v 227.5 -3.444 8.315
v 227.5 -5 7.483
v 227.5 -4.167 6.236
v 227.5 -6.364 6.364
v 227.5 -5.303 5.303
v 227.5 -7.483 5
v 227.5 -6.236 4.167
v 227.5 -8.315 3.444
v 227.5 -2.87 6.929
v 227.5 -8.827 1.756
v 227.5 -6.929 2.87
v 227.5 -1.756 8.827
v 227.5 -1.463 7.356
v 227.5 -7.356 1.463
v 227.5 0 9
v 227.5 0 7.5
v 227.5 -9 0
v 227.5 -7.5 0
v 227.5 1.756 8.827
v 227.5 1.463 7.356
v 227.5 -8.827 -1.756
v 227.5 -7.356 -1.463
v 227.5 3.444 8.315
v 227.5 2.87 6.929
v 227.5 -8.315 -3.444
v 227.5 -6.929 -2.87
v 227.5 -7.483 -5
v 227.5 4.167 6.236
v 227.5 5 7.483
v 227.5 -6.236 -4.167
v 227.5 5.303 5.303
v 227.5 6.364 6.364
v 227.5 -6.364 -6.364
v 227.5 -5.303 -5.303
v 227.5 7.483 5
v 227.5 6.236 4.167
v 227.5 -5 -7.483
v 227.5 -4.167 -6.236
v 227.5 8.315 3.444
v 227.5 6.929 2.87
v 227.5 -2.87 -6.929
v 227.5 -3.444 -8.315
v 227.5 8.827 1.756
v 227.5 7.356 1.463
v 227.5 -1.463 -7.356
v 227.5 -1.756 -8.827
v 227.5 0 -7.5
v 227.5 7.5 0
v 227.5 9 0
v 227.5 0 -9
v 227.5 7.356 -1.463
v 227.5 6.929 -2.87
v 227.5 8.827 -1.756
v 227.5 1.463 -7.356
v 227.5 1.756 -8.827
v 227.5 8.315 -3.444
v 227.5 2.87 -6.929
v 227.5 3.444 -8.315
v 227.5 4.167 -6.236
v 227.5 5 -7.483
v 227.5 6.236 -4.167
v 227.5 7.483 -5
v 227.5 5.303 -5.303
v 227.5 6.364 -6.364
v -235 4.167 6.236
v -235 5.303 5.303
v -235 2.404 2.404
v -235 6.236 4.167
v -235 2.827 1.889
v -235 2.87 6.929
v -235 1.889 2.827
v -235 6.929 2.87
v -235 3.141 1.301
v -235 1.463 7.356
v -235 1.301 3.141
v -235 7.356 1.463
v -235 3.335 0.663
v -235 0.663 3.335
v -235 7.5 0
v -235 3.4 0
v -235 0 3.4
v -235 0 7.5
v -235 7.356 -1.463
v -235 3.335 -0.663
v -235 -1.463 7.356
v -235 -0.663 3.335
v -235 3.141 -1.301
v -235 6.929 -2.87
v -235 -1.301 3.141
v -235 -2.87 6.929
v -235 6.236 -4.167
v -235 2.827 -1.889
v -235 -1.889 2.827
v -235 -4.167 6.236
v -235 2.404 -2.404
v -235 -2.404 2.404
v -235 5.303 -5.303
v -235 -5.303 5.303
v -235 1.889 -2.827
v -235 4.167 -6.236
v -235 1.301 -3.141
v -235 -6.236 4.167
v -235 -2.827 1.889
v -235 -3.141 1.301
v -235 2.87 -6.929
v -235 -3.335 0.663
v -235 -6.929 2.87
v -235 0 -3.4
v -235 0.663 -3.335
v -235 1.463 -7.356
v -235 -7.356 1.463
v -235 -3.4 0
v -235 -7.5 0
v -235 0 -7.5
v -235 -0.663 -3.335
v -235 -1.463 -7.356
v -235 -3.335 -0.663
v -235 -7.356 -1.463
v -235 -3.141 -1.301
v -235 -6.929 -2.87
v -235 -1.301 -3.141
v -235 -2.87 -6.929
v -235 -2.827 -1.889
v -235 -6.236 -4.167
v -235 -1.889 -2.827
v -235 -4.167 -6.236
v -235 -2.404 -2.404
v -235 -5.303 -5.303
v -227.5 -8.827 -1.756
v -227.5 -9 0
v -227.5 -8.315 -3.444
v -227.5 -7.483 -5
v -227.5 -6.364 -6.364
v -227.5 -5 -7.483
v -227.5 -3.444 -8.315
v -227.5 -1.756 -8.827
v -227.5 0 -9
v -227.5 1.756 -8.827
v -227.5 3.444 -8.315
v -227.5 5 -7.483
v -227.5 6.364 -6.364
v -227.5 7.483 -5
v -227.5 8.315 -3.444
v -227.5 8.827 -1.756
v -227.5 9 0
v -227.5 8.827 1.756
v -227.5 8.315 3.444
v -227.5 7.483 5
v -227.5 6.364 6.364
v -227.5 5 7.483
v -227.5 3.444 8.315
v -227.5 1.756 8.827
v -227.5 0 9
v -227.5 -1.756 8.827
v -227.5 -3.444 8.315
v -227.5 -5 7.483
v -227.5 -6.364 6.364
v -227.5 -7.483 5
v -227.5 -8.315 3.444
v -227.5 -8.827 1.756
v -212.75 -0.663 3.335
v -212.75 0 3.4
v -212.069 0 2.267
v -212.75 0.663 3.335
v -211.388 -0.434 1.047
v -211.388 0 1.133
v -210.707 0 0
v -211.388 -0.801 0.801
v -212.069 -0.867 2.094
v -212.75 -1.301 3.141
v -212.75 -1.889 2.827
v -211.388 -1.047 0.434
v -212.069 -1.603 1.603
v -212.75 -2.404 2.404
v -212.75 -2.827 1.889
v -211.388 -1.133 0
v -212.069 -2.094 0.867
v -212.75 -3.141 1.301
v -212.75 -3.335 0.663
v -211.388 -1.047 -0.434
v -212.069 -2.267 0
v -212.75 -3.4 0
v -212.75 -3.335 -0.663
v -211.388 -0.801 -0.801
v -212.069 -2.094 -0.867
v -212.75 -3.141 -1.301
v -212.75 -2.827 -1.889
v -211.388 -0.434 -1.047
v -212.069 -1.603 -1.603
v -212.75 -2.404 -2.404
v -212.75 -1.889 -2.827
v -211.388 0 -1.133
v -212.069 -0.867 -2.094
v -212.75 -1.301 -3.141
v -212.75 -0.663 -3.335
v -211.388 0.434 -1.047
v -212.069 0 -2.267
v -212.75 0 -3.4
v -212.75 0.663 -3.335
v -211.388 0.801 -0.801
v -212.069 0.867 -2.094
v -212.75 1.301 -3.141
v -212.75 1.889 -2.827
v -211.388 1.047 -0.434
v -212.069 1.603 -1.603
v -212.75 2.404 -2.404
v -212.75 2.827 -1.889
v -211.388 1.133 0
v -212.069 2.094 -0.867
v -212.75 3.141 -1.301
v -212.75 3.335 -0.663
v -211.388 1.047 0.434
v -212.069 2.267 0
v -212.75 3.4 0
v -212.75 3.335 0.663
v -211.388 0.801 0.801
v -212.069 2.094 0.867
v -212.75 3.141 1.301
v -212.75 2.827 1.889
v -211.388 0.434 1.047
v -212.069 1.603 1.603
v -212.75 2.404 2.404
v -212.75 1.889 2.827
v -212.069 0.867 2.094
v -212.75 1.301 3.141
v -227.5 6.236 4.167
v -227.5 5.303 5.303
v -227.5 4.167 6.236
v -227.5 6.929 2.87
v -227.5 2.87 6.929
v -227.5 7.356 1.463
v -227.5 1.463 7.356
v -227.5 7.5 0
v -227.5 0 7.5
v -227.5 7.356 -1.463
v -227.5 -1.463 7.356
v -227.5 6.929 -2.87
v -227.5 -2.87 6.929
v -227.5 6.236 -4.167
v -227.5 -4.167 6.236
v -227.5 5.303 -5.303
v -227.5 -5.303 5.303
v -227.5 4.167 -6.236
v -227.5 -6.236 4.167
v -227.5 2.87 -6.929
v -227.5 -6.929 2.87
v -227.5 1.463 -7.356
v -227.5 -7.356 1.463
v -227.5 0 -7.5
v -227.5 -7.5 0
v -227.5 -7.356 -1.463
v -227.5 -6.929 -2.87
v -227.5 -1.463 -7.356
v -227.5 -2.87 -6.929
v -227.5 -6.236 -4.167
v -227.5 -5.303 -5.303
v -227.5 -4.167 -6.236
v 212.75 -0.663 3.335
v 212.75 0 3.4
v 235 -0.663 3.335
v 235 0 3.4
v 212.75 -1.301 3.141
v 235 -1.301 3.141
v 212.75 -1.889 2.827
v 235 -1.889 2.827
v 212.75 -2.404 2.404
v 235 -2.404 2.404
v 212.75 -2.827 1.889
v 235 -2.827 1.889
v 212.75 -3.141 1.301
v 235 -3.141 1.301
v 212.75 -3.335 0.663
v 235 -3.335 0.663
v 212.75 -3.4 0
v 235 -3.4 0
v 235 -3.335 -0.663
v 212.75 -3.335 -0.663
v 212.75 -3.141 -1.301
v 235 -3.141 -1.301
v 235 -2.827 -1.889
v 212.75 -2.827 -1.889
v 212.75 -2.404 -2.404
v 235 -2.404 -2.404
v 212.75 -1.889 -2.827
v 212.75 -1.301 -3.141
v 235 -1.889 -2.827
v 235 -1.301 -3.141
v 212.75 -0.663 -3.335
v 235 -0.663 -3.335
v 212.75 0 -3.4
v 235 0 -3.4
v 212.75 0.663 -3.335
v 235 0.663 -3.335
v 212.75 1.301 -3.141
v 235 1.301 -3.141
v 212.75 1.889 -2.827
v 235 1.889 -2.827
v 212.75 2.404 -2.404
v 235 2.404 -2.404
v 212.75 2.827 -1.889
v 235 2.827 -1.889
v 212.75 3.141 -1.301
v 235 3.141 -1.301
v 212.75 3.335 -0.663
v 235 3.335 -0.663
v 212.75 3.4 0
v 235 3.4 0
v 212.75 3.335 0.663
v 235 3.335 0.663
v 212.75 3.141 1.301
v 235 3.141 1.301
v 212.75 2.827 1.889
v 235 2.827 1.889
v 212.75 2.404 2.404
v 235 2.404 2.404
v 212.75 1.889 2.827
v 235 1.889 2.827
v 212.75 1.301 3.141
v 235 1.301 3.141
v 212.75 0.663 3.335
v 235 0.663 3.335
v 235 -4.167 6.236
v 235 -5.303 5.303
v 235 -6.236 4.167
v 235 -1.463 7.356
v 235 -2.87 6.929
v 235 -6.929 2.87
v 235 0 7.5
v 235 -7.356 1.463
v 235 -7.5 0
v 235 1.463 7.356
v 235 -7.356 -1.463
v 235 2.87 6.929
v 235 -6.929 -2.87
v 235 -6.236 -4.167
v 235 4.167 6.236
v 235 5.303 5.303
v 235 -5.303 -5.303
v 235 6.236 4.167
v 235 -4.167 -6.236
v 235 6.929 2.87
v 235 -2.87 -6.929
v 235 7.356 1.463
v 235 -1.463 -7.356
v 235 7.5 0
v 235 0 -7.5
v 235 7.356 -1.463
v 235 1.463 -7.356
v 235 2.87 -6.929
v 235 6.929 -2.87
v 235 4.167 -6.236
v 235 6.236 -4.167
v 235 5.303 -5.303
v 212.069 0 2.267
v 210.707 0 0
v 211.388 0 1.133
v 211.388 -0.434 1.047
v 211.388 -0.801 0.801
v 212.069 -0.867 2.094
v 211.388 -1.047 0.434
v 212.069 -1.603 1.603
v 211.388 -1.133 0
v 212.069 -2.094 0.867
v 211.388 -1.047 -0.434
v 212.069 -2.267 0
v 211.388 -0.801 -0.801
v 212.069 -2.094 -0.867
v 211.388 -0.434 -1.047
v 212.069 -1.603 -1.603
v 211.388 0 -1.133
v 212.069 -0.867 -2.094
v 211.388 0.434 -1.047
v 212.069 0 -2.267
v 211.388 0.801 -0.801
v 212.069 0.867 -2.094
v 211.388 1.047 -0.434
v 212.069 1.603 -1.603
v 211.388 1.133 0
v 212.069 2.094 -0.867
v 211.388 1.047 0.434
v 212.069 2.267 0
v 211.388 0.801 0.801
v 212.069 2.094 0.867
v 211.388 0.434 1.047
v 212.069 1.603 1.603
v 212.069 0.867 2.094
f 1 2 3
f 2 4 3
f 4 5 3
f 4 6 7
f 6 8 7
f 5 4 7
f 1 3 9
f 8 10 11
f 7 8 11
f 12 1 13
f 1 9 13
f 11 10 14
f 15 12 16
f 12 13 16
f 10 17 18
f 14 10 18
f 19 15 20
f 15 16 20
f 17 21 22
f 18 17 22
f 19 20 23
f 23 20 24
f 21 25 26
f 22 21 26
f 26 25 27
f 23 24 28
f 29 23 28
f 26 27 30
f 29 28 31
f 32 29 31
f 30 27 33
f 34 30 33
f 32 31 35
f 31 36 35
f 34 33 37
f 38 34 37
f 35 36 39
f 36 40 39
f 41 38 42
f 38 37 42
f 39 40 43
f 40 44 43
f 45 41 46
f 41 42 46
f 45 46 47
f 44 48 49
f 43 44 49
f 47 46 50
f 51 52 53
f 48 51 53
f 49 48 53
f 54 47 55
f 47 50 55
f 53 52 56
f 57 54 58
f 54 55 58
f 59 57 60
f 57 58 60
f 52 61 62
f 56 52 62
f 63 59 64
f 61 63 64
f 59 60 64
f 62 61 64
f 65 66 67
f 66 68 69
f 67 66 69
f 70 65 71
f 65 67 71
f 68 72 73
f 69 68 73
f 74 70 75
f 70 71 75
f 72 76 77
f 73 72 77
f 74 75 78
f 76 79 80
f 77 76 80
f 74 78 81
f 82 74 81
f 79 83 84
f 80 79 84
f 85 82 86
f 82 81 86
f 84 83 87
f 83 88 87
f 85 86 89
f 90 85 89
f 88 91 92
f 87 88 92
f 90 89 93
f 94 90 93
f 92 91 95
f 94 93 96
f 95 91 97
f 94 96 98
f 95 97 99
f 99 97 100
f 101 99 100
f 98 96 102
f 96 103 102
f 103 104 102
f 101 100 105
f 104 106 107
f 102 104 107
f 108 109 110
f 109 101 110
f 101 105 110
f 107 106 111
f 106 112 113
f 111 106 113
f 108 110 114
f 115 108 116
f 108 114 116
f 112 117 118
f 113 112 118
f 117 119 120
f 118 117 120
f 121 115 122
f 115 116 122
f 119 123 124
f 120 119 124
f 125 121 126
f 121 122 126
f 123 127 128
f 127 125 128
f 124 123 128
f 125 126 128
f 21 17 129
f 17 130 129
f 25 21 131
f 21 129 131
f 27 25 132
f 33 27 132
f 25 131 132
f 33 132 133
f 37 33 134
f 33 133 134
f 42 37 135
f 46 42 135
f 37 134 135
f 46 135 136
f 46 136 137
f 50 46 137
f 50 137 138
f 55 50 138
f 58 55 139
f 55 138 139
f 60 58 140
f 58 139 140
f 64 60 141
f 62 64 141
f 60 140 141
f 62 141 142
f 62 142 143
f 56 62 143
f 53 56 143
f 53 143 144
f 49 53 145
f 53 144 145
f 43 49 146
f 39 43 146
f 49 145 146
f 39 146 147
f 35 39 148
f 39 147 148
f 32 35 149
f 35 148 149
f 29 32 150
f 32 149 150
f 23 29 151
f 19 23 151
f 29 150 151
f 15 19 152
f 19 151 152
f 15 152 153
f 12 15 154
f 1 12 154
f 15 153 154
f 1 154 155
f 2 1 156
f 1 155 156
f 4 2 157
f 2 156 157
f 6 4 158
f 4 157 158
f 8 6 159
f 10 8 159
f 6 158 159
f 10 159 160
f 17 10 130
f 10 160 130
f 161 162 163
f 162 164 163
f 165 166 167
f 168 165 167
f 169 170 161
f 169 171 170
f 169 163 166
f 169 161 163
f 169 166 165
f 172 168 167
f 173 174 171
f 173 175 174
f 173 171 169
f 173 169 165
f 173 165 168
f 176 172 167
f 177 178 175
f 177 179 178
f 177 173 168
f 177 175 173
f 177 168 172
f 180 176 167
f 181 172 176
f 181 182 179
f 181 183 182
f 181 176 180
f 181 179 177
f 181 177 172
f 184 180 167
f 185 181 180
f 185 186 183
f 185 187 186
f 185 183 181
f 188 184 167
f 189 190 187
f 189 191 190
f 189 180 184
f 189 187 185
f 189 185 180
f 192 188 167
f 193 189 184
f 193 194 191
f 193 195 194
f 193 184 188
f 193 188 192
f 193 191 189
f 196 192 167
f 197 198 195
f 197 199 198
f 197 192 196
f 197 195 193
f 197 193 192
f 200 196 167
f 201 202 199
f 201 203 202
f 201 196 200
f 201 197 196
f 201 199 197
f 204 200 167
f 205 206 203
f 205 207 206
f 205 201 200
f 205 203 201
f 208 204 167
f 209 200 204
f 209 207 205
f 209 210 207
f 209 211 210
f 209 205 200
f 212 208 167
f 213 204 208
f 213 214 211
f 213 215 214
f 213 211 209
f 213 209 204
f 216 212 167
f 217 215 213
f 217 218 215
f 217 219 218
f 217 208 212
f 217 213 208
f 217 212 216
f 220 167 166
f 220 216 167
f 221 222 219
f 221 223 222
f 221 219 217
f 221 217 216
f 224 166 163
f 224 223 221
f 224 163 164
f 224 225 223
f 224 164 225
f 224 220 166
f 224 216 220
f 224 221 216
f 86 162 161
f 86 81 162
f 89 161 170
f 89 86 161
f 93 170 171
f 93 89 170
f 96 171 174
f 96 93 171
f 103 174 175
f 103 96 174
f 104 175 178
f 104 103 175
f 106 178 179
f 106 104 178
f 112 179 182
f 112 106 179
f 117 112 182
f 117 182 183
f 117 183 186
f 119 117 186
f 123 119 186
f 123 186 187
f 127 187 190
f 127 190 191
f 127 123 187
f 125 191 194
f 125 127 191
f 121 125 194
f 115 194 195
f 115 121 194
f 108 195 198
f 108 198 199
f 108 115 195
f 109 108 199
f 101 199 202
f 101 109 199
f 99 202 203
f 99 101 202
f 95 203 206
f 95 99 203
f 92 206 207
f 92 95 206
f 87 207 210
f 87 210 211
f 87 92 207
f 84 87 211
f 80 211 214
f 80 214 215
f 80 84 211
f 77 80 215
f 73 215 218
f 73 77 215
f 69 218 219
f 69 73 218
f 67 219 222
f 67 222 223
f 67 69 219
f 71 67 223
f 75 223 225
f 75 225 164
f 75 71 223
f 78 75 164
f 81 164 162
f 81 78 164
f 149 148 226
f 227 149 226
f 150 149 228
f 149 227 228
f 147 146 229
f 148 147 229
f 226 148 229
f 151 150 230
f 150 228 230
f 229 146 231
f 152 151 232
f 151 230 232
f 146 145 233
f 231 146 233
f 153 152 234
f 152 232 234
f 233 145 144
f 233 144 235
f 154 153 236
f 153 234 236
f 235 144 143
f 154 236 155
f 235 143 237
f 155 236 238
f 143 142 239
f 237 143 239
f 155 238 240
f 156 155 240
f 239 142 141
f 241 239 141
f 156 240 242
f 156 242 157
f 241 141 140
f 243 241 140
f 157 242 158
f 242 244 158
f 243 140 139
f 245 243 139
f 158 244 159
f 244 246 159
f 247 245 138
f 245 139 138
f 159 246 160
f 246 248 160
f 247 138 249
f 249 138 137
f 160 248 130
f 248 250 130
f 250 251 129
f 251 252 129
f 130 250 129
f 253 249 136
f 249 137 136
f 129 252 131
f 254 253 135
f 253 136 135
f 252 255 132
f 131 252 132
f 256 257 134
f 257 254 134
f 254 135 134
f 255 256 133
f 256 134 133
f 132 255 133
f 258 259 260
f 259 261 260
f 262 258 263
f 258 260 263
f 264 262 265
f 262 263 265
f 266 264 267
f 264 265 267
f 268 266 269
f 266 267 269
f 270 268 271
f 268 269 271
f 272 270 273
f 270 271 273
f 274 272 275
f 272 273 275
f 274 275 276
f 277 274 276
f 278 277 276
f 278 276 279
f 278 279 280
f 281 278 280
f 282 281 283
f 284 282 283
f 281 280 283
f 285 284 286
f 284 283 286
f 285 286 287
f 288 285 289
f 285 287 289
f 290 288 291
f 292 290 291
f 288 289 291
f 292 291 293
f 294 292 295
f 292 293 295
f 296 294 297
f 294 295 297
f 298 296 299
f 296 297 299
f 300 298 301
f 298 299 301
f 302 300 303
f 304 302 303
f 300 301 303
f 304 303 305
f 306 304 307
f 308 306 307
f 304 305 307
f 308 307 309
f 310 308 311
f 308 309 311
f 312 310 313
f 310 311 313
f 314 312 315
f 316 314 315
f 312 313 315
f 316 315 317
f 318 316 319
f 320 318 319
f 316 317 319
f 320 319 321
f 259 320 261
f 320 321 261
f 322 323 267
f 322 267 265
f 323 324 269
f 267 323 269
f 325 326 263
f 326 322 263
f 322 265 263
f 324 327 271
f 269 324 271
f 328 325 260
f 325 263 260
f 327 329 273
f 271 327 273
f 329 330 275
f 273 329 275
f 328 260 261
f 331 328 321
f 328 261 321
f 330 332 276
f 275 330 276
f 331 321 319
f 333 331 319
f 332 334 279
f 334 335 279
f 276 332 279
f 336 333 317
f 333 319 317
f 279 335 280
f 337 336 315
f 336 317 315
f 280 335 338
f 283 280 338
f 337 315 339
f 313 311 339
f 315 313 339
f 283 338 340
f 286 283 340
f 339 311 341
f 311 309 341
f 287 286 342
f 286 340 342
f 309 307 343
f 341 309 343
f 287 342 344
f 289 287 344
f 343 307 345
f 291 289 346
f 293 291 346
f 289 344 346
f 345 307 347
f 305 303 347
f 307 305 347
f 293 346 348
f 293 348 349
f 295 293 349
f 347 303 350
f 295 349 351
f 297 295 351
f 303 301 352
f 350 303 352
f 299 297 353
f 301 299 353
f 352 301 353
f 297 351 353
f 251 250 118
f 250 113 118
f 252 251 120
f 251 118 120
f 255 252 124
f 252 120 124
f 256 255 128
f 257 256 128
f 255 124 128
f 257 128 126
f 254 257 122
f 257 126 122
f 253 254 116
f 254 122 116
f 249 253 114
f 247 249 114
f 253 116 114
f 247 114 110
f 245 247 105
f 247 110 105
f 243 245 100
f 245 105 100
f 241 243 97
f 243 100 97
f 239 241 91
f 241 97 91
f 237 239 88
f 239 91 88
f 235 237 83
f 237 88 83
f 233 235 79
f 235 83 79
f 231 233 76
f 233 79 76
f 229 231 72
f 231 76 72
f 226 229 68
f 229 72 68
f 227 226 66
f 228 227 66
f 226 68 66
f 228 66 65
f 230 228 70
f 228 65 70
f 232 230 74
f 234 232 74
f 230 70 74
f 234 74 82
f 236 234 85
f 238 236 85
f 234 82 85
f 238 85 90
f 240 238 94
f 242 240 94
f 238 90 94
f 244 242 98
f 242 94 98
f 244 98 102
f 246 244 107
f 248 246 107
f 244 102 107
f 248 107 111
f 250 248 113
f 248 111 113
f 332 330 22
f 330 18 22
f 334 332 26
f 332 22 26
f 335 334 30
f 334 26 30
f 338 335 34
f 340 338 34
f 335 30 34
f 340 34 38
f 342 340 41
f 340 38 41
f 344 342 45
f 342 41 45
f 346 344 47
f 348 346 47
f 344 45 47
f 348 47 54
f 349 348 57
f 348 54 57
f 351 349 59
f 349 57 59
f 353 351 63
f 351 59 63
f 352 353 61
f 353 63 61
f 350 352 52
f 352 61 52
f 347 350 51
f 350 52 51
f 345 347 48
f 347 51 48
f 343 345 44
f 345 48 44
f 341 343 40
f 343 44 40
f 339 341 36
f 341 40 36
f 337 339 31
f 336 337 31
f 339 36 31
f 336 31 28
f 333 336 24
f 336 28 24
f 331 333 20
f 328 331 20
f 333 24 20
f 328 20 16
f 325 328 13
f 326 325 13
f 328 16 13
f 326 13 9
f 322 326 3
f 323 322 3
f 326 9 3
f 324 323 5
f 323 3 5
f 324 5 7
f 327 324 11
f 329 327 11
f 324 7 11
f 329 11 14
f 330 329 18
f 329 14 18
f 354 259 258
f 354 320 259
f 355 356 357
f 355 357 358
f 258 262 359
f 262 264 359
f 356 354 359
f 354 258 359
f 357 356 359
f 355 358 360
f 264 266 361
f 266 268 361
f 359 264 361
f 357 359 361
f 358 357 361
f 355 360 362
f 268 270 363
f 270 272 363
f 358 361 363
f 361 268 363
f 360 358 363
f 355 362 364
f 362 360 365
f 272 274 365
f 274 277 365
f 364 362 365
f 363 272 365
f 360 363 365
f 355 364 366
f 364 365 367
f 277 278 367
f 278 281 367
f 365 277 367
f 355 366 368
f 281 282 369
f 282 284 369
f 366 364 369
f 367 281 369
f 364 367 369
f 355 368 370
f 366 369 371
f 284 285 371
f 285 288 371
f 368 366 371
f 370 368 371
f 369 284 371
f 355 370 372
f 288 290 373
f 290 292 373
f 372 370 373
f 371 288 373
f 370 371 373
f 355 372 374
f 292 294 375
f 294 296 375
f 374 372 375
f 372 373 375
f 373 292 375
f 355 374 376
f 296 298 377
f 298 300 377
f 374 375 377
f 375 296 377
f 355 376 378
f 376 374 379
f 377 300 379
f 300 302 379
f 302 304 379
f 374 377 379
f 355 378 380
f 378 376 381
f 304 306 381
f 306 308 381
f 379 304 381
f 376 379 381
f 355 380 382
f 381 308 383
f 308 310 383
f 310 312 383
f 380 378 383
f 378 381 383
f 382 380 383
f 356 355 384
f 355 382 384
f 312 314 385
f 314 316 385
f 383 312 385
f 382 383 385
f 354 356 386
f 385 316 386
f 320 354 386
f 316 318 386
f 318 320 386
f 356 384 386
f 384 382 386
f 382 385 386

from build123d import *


with BuildPart() as part:
    # Çizim1 → Döndür2 (revolve)
    with BuildSketch(Plane.XY, mode=Mode.PRIVATE) as d_nd_r2_sk:
        Polygon((-235, 0), (235, 0), (235, 7.5), (227.5, 7.5), (227.5, 9), (-227.5, 9), (-227.5, 7.5), (-235, 7.5), align=None)
    revolve(d_nd_r2_sk.sketch.rotate(Axis((-235, 0, 0), (1, 0, 0)), 180), axis=Axis((-235, 0, 0), (1, 0, 0)))

    # Çizim4 → M8 Dişli Delik3 (revolve, cut)
    with BuildSketch(Plane(origin=(-235, 0, 0), x_dir=(0, 0, 1), z_dir=(0, 1, 0))):
        Polygon((0, 0), (0, 24.292926105), (3.4, 22.25), (3.4, 0), align=None)
    m8_di_li_delik3 = revolve(axis=Axis((-241.35, 0, 0), (1, 0, 0)), mode=Mode.SUBTRACT)

    # Aynalama1: M8 Dişli Delik3 across plane
    add(m8_di_li_delik3.mirror(Plane(origin=(0, 0, 0), x_dir=(0, 0, 1), z_dir=(1, 0, 0))), mode=Mode.SUBTRACT)


solid = part.part
